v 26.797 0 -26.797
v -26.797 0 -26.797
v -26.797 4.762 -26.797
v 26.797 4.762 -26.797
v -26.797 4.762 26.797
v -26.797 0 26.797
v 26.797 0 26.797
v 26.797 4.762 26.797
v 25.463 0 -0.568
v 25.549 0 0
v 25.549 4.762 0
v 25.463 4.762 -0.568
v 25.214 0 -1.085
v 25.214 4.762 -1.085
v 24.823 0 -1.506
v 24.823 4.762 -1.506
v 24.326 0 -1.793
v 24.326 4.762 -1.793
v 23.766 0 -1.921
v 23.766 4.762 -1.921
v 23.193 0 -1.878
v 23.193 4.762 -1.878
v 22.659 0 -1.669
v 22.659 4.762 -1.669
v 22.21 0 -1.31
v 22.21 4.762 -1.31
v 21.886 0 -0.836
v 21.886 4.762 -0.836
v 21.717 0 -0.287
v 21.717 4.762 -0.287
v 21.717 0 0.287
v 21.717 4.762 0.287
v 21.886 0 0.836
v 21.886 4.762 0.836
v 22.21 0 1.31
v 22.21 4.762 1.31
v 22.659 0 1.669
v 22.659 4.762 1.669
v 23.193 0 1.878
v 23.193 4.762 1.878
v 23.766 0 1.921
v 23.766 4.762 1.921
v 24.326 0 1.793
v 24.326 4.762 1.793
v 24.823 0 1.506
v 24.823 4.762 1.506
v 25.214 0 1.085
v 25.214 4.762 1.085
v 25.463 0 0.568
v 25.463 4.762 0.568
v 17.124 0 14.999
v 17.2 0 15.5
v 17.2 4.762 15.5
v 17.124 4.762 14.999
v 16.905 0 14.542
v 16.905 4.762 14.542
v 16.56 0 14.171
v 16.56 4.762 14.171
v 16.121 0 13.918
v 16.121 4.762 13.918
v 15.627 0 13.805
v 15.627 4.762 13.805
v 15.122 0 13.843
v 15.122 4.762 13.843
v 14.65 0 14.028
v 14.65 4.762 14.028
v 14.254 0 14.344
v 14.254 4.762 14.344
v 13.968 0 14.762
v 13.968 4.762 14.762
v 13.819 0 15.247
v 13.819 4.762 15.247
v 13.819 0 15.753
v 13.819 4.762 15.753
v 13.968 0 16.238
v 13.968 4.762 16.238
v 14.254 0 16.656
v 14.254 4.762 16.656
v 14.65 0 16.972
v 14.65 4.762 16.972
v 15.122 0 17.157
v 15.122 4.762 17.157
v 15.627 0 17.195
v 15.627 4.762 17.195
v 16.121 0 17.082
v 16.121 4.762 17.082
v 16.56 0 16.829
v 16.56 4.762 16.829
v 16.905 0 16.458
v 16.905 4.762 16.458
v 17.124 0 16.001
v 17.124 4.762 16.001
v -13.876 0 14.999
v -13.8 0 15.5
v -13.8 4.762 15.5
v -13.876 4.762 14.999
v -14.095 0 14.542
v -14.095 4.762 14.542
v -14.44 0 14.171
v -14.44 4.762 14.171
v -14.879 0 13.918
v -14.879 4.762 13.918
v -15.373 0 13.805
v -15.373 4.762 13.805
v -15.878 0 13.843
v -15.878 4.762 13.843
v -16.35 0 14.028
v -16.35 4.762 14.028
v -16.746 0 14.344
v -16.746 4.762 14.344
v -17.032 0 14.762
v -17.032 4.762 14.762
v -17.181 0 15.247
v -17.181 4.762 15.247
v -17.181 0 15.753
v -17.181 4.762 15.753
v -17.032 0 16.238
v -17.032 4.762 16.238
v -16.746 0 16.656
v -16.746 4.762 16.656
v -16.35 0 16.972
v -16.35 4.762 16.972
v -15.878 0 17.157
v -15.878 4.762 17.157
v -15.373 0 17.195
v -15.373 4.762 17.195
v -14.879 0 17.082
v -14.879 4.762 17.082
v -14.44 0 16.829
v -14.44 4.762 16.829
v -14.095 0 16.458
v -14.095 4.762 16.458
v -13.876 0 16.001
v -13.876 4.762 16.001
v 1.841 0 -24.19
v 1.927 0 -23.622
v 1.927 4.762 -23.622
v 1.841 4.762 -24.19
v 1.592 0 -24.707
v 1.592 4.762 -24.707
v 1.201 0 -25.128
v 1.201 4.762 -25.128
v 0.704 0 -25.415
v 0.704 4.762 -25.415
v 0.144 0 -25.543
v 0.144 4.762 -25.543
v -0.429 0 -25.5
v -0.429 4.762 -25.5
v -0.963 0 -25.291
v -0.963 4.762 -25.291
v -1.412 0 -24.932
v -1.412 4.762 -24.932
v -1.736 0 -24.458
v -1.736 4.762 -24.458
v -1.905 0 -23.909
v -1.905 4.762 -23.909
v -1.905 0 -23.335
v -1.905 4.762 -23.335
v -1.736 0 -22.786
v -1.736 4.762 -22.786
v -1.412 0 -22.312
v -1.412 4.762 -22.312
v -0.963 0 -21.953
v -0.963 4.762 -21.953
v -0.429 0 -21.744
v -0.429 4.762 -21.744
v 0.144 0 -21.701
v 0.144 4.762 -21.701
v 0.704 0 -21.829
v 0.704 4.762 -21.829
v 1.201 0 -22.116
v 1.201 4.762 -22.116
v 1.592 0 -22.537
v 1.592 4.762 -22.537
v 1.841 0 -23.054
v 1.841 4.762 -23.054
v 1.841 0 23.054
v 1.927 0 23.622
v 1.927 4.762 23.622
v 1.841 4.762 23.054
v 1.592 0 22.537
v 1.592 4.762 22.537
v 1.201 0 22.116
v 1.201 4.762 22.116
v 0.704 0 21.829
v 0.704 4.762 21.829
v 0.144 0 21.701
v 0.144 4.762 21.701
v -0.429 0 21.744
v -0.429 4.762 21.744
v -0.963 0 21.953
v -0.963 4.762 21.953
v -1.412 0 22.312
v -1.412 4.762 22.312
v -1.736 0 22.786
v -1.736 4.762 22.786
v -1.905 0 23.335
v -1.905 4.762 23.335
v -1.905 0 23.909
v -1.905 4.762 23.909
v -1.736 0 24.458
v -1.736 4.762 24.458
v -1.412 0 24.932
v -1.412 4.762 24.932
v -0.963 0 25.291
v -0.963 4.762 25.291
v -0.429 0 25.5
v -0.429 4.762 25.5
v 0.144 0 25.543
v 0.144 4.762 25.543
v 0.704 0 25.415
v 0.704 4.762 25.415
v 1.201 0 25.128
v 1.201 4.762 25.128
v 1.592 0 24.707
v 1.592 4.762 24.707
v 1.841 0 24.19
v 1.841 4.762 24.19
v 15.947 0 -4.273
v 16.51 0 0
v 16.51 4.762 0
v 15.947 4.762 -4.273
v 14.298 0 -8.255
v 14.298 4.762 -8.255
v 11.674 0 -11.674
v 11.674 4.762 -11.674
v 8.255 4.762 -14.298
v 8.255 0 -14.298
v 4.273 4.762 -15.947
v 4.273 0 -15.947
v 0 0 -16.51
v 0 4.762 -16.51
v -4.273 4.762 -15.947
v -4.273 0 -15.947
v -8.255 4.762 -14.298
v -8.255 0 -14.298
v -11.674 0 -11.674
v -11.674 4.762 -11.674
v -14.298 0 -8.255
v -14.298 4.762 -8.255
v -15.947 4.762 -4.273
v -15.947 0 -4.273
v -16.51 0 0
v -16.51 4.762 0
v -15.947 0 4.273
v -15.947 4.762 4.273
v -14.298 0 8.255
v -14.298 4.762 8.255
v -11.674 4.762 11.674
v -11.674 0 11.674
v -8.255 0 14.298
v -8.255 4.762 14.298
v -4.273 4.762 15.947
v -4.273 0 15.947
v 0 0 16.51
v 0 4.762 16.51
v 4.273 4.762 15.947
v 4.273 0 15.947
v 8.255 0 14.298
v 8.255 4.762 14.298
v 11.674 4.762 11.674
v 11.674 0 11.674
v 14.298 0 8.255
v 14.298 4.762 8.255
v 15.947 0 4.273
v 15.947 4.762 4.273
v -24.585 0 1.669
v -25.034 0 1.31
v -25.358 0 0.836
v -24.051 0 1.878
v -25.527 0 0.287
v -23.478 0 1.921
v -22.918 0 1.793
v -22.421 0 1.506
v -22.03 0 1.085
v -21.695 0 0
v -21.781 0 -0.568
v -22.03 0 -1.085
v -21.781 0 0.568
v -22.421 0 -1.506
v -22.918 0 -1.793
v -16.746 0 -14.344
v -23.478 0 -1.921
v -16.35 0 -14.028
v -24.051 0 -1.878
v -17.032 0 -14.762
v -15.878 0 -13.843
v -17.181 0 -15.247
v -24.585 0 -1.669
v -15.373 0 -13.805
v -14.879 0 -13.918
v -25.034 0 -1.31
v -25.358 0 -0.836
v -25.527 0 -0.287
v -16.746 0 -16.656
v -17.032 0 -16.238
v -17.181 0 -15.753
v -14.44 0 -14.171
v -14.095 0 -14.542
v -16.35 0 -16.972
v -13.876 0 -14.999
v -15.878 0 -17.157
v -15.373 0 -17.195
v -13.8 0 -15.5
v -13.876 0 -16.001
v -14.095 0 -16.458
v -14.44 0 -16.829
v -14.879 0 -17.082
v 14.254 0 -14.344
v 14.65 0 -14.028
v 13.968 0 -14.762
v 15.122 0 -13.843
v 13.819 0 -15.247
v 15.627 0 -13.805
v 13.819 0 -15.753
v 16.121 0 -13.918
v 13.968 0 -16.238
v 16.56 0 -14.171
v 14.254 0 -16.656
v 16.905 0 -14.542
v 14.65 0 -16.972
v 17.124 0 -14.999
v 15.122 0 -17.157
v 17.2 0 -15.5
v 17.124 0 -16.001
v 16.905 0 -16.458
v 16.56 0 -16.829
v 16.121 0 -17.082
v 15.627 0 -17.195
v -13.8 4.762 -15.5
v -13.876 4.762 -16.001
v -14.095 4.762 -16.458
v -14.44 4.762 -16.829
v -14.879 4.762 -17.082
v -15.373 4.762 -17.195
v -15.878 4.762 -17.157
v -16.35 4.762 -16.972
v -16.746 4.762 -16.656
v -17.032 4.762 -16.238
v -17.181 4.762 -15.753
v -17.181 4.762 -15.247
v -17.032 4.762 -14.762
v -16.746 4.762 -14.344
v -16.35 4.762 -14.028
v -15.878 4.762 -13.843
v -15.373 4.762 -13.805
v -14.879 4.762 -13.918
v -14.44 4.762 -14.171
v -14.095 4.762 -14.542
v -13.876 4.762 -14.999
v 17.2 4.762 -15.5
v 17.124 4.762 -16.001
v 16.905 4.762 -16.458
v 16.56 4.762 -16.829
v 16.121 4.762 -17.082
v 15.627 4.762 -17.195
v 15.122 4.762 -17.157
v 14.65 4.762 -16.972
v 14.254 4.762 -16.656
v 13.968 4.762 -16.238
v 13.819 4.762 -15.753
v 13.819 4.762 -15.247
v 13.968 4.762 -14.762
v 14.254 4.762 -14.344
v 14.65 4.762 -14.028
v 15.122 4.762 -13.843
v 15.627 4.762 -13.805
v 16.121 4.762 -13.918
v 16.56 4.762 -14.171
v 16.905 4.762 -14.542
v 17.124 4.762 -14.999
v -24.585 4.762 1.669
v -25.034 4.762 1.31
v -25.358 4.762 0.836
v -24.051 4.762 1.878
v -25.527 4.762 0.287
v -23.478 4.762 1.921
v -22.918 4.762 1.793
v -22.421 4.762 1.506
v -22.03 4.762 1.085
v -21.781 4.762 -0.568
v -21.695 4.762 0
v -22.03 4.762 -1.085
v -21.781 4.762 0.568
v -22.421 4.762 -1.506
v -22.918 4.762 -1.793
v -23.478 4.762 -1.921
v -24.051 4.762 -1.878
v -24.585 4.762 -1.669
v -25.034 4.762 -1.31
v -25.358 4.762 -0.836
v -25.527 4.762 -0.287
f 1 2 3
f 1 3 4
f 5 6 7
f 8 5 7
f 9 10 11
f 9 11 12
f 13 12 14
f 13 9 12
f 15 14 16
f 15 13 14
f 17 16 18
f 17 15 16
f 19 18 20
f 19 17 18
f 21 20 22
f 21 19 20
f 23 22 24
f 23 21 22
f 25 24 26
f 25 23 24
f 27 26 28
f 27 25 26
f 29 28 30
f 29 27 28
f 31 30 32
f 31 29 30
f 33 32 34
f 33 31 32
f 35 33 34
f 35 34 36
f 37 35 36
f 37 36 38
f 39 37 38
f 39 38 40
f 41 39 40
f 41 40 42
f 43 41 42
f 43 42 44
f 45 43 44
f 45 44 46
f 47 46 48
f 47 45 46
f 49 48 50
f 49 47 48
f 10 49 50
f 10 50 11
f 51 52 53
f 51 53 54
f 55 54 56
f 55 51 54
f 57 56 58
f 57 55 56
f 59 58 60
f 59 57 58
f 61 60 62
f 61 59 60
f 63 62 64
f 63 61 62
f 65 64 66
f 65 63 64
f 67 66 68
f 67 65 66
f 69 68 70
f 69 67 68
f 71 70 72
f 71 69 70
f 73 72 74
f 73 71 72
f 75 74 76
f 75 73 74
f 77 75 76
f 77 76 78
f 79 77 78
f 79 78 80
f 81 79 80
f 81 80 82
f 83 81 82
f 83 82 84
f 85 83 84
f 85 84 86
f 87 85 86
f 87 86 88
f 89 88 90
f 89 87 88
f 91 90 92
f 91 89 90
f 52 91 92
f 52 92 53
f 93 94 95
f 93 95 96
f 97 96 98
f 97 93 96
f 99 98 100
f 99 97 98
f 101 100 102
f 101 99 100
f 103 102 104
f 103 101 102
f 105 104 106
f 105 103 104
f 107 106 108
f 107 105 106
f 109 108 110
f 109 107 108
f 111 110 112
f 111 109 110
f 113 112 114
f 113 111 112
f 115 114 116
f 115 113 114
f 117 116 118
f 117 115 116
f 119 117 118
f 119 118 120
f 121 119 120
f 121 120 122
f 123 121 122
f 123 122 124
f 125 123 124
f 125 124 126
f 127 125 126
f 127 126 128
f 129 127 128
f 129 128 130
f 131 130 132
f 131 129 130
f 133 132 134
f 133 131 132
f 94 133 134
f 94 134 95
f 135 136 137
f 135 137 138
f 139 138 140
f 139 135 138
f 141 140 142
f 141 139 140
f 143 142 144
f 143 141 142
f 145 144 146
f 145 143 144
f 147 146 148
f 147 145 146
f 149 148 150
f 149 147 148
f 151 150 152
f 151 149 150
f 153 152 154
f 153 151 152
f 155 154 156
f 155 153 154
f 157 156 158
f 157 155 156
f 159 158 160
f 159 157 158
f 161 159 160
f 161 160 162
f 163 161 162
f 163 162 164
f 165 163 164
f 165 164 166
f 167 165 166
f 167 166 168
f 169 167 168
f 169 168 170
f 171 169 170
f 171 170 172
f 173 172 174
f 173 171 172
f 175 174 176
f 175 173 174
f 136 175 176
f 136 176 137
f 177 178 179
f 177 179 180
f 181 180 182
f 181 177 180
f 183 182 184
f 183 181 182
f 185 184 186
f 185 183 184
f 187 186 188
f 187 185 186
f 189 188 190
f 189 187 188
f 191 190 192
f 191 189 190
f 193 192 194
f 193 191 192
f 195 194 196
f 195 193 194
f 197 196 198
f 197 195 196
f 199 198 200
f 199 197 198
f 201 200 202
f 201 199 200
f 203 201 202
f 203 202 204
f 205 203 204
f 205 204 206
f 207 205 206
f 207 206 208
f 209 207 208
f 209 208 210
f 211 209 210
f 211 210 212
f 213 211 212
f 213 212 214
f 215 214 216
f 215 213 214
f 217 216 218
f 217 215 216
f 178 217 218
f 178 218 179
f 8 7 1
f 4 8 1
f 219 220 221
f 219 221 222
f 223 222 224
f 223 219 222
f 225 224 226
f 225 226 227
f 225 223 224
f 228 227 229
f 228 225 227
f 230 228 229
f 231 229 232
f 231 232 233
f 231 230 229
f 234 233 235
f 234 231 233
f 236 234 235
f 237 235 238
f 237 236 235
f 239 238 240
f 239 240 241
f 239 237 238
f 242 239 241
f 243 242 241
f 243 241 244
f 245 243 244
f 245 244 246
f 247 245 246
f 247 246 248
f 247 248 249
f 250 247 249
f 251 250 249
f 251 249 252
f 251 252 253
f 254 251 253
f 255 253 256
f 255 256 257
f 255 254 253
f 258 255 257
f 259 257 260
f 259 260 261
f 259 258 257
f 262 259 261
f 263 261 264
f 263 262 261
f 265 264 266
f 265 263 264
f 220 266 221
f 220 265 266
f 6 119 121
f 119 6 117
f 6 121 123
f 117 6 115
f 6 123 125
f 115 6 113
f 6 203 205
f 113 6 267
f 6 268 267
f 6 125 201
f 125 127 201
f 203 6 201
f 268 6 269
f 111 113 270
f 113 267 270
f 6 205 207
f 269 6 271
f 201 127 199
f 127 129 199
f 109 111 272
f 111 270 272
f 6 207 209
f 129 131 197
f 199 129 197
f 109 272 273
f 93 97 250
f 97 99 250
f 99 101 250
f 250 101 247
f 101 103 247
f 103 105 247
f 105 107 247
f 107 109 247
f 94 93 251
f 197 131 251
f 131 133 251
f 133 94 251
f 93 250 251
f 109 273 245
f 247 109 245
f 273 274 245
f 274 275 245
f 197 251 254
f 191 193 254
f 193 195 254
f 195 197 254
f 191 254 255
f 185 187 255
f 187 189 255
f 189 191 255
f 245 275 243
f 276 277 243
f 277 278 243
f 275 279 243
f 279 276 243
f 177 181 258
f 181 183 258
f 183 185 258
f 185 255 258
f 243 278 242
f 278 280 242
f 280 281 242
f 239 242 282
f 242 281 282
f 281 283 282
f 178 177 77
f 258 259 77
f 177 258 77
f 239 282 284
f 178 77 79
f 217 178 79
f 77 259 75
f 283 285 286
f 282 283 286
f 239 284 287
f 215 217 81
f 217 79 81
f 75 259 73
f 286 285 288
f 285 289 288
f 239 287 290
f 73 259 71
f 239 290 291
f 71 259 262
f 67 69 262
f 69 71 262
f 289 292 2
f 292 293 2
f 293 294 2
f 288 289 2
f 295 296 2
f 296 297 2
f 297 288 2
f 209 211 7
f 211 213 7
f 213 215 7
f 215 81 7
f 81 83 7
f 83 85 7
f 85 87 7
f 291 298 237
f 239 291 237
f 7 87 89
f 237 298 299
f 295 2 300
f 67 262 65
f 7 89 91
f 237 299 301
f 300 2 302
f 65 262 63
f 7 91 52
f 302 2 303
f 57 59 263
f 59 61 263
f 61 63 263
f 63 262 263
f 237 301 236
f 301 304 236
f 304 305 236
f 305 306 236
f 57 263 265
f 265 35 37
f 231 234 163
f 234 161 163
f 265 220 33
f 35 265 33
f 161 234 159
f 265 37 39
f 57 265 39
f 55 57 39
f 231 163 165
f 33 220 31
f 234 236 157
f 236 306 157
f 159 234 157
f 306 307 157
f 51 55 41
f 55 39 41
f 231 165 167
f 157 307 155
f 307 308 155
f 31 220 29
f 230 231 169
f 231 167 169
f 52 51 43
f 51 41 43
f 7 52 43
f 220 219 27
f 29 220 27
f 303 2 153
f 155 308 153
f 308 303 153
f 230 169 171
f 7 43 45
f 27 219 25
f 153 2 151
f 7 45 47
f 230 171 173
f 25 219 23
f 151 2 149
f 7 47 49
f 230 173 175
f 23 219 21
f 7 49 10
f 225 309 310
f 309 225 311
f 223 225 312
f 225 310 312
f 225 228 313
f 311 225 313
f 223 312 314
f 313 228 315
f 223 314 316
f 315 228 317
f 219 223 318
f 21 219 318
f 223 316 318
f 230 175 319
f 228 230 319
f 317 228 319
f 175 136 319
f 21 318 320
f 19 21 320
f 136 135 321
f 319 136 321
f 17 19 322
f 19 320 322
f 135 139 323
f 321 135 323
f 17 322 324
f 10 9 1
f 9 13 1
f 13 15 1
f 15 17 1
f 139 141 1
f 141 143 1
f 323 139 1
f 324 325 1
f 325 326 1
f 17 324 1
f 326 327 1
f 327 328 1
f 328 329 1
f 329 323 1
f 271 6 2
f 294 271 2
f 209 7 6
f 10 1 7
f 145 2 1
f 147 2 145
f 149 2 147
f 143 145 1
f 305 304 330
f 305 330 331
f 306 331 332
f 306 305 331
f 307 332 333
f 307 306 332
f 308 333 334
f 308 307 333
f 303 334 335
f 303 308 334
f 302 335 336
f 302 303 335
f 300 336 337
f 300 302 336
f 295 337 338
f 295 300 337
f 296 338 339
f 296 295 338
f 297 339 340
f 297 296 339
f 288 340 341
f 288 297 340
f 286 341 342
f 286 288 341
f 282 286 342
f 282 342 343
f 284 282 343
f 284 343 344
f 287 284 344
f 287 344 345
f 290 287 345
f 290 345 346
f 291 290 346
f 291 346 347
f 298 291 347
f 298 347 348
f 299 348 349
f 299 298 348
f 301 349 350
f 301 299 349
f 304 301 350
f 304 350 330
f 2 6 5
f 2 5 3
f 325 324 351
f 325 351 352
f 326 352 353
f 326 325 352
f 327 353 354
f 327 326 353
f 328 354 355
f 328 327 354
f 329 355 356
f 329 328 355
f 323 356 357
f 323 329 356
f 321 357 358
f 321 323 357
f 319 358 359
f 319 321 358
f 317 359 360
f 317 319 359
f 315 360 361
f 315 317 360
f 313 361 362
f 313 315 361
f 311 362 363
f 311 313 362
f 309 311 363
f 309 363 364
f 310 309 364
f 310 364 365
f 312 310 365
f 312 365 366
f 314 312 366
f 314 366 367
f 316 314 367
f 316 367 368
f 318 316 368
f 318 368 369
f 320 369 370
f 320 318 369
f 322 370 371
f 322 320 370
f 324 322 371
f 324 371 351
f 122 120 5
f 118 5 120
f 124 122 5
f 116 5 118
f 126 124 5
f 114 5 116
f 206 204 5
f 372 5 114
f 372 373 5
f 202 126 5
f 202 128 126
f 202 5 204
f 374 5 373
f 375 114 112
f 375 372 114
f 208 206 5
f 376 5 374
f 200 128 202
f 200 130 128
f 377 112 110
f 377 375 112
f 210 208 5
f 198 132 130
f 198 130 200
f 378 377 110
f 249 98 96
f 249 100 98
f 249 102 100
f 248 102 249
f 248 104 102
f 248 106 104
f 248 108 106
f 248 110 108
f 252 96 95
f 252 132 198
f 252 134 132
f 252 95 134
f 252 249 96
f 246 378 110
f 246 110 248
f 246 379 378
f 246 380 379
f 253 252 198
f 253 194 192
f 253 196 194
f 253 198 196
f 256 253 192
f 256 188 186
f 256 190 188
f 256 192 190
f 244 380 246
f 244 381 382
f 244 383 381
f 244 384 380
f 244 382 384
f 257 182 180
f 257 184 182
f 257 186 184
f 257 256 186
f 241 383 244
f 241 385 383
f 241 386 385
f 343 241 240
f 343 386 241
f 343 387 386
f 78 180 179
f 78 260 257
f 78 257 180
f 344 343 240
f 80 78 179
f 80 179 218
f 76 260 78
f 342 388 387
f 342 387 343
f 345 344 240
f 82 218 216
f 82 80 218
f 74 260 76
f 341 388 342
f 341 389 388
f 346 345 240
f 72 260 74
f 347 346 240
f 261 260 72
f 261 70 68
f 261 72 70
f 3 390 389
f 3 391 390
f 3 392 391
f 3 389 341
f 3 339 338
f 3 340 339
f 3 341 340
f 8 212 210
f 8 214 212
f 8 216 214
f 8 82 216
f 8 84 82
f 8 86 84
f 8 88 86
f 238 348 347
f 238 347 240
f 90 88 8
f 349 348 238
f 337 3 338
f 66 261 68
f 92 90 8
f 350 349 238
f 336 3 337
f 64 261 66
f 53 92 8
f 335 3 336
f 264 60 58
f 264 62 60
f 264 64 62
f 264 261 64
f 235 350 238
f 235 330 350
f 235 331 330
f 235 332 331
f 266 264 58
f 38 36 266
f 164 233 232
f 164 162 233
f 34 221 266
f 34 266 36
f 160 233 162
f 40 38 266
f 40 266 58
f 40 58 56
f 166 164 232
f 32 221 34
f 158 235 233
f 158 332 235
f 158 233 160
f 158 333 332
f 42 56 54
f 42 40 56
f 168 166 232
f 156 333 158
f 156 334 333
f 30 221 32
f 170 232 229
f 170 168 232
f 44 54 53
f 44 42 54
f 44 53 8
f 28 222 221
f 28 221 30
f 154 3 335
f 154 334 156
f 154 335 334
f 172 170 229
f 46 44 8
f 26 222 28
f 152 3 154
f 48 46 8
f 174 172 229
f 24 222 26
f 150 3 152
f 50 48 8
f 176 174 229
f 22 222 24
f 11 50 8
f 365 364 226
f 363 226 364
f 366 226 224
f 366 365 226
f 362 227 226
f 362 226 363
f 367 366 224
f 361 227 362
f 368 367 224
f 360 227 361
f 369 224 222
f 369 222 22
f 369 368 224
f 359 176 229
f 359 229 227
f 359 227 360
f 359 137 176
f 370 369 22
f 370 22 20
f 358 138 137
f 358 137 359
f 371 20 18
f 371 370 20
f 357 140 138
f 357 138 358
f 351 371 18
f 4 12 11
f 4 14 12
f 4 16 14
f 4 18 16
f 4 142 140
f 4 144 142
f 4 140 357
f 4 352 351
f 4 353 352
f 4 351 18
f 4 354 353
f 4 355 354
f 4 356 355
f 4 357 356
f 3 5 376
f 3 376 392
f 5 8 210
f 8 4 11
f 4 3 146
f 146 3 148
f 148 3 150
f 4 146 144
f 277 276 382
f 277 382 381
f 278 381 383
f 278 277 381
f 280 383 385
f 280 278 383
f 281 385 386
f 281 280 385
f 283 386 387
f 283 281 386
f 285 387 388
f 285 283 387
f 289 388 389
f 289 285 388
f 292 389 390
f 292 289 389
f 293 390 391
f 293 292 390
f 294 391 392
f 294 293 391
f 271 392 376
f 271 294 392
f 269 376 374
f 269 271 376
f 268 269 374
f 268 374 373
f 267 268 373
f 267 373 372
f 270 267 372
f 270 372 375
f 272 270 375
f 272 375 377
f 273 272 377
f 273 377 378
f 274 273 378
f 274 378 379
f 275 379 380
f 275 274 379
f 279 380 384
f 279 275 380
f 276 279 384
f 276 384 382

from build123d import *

# Parameters (mm, degrees)
SKETCH1_W           = 53.594
SKETCH1_H           = 53.594
SKETCH1_R           = 16.51
SKETCH1_R_2         = 1.7
SKETCH1_R_3         = 1.926649595
BOSS_EXTRUDE1_DEPTH = 4.7625


with BuildPart() as part:
    # Sketch1 → Boss-Extrude1 (new body)
    with BuildSketch(Plane(origin=(0, 0, 0), x_dir=(1, 0, 0), z_dir=(0, 1, 0))):
        Rectangle(SKETCH1_W, SKETCH1_H)
        Circle(SKETCH1_R, mode=Mode.SUBTRACT)
        with Locations((-15.5, 15.5)):
            Circle(SKETCH1_R_2, mode=Mode.SUBTRACT)
        with Locations((15.5, 15.5)):
            Circle(SKETCH1_R_2, mode=Mode.SUBTRACT)
        with Locations((15.5, -15.5)):
            Circle(SKETCH1_R_2, mode=Mode.SUBTRACT)
        with Locations((-15.5, -15.5)):
            Circle(SKETCH1_R_2, mode=Mode.SUBTRACT)
        with Locations((0, 23.622)):
            Circle(SKETCH1_R_3, mode=Mode.SUBTRACT)
        with Locations((23.622, 0)):
            Circle(SKETCH1_R_3, mode=Mode.SUBTRACT)
        with Locations((0, -23.622)):
            Circle(SKETCH1_R_3, mode=Mode.SUBTRACT)
        with Locations((-23.622, 0)):
            Circle(SKETCH1_R_3, mode=Mode.SUBTRACT)
    extrude(amount=BOSS_EXTRUDE1_DEPTH)


solid = part.part
